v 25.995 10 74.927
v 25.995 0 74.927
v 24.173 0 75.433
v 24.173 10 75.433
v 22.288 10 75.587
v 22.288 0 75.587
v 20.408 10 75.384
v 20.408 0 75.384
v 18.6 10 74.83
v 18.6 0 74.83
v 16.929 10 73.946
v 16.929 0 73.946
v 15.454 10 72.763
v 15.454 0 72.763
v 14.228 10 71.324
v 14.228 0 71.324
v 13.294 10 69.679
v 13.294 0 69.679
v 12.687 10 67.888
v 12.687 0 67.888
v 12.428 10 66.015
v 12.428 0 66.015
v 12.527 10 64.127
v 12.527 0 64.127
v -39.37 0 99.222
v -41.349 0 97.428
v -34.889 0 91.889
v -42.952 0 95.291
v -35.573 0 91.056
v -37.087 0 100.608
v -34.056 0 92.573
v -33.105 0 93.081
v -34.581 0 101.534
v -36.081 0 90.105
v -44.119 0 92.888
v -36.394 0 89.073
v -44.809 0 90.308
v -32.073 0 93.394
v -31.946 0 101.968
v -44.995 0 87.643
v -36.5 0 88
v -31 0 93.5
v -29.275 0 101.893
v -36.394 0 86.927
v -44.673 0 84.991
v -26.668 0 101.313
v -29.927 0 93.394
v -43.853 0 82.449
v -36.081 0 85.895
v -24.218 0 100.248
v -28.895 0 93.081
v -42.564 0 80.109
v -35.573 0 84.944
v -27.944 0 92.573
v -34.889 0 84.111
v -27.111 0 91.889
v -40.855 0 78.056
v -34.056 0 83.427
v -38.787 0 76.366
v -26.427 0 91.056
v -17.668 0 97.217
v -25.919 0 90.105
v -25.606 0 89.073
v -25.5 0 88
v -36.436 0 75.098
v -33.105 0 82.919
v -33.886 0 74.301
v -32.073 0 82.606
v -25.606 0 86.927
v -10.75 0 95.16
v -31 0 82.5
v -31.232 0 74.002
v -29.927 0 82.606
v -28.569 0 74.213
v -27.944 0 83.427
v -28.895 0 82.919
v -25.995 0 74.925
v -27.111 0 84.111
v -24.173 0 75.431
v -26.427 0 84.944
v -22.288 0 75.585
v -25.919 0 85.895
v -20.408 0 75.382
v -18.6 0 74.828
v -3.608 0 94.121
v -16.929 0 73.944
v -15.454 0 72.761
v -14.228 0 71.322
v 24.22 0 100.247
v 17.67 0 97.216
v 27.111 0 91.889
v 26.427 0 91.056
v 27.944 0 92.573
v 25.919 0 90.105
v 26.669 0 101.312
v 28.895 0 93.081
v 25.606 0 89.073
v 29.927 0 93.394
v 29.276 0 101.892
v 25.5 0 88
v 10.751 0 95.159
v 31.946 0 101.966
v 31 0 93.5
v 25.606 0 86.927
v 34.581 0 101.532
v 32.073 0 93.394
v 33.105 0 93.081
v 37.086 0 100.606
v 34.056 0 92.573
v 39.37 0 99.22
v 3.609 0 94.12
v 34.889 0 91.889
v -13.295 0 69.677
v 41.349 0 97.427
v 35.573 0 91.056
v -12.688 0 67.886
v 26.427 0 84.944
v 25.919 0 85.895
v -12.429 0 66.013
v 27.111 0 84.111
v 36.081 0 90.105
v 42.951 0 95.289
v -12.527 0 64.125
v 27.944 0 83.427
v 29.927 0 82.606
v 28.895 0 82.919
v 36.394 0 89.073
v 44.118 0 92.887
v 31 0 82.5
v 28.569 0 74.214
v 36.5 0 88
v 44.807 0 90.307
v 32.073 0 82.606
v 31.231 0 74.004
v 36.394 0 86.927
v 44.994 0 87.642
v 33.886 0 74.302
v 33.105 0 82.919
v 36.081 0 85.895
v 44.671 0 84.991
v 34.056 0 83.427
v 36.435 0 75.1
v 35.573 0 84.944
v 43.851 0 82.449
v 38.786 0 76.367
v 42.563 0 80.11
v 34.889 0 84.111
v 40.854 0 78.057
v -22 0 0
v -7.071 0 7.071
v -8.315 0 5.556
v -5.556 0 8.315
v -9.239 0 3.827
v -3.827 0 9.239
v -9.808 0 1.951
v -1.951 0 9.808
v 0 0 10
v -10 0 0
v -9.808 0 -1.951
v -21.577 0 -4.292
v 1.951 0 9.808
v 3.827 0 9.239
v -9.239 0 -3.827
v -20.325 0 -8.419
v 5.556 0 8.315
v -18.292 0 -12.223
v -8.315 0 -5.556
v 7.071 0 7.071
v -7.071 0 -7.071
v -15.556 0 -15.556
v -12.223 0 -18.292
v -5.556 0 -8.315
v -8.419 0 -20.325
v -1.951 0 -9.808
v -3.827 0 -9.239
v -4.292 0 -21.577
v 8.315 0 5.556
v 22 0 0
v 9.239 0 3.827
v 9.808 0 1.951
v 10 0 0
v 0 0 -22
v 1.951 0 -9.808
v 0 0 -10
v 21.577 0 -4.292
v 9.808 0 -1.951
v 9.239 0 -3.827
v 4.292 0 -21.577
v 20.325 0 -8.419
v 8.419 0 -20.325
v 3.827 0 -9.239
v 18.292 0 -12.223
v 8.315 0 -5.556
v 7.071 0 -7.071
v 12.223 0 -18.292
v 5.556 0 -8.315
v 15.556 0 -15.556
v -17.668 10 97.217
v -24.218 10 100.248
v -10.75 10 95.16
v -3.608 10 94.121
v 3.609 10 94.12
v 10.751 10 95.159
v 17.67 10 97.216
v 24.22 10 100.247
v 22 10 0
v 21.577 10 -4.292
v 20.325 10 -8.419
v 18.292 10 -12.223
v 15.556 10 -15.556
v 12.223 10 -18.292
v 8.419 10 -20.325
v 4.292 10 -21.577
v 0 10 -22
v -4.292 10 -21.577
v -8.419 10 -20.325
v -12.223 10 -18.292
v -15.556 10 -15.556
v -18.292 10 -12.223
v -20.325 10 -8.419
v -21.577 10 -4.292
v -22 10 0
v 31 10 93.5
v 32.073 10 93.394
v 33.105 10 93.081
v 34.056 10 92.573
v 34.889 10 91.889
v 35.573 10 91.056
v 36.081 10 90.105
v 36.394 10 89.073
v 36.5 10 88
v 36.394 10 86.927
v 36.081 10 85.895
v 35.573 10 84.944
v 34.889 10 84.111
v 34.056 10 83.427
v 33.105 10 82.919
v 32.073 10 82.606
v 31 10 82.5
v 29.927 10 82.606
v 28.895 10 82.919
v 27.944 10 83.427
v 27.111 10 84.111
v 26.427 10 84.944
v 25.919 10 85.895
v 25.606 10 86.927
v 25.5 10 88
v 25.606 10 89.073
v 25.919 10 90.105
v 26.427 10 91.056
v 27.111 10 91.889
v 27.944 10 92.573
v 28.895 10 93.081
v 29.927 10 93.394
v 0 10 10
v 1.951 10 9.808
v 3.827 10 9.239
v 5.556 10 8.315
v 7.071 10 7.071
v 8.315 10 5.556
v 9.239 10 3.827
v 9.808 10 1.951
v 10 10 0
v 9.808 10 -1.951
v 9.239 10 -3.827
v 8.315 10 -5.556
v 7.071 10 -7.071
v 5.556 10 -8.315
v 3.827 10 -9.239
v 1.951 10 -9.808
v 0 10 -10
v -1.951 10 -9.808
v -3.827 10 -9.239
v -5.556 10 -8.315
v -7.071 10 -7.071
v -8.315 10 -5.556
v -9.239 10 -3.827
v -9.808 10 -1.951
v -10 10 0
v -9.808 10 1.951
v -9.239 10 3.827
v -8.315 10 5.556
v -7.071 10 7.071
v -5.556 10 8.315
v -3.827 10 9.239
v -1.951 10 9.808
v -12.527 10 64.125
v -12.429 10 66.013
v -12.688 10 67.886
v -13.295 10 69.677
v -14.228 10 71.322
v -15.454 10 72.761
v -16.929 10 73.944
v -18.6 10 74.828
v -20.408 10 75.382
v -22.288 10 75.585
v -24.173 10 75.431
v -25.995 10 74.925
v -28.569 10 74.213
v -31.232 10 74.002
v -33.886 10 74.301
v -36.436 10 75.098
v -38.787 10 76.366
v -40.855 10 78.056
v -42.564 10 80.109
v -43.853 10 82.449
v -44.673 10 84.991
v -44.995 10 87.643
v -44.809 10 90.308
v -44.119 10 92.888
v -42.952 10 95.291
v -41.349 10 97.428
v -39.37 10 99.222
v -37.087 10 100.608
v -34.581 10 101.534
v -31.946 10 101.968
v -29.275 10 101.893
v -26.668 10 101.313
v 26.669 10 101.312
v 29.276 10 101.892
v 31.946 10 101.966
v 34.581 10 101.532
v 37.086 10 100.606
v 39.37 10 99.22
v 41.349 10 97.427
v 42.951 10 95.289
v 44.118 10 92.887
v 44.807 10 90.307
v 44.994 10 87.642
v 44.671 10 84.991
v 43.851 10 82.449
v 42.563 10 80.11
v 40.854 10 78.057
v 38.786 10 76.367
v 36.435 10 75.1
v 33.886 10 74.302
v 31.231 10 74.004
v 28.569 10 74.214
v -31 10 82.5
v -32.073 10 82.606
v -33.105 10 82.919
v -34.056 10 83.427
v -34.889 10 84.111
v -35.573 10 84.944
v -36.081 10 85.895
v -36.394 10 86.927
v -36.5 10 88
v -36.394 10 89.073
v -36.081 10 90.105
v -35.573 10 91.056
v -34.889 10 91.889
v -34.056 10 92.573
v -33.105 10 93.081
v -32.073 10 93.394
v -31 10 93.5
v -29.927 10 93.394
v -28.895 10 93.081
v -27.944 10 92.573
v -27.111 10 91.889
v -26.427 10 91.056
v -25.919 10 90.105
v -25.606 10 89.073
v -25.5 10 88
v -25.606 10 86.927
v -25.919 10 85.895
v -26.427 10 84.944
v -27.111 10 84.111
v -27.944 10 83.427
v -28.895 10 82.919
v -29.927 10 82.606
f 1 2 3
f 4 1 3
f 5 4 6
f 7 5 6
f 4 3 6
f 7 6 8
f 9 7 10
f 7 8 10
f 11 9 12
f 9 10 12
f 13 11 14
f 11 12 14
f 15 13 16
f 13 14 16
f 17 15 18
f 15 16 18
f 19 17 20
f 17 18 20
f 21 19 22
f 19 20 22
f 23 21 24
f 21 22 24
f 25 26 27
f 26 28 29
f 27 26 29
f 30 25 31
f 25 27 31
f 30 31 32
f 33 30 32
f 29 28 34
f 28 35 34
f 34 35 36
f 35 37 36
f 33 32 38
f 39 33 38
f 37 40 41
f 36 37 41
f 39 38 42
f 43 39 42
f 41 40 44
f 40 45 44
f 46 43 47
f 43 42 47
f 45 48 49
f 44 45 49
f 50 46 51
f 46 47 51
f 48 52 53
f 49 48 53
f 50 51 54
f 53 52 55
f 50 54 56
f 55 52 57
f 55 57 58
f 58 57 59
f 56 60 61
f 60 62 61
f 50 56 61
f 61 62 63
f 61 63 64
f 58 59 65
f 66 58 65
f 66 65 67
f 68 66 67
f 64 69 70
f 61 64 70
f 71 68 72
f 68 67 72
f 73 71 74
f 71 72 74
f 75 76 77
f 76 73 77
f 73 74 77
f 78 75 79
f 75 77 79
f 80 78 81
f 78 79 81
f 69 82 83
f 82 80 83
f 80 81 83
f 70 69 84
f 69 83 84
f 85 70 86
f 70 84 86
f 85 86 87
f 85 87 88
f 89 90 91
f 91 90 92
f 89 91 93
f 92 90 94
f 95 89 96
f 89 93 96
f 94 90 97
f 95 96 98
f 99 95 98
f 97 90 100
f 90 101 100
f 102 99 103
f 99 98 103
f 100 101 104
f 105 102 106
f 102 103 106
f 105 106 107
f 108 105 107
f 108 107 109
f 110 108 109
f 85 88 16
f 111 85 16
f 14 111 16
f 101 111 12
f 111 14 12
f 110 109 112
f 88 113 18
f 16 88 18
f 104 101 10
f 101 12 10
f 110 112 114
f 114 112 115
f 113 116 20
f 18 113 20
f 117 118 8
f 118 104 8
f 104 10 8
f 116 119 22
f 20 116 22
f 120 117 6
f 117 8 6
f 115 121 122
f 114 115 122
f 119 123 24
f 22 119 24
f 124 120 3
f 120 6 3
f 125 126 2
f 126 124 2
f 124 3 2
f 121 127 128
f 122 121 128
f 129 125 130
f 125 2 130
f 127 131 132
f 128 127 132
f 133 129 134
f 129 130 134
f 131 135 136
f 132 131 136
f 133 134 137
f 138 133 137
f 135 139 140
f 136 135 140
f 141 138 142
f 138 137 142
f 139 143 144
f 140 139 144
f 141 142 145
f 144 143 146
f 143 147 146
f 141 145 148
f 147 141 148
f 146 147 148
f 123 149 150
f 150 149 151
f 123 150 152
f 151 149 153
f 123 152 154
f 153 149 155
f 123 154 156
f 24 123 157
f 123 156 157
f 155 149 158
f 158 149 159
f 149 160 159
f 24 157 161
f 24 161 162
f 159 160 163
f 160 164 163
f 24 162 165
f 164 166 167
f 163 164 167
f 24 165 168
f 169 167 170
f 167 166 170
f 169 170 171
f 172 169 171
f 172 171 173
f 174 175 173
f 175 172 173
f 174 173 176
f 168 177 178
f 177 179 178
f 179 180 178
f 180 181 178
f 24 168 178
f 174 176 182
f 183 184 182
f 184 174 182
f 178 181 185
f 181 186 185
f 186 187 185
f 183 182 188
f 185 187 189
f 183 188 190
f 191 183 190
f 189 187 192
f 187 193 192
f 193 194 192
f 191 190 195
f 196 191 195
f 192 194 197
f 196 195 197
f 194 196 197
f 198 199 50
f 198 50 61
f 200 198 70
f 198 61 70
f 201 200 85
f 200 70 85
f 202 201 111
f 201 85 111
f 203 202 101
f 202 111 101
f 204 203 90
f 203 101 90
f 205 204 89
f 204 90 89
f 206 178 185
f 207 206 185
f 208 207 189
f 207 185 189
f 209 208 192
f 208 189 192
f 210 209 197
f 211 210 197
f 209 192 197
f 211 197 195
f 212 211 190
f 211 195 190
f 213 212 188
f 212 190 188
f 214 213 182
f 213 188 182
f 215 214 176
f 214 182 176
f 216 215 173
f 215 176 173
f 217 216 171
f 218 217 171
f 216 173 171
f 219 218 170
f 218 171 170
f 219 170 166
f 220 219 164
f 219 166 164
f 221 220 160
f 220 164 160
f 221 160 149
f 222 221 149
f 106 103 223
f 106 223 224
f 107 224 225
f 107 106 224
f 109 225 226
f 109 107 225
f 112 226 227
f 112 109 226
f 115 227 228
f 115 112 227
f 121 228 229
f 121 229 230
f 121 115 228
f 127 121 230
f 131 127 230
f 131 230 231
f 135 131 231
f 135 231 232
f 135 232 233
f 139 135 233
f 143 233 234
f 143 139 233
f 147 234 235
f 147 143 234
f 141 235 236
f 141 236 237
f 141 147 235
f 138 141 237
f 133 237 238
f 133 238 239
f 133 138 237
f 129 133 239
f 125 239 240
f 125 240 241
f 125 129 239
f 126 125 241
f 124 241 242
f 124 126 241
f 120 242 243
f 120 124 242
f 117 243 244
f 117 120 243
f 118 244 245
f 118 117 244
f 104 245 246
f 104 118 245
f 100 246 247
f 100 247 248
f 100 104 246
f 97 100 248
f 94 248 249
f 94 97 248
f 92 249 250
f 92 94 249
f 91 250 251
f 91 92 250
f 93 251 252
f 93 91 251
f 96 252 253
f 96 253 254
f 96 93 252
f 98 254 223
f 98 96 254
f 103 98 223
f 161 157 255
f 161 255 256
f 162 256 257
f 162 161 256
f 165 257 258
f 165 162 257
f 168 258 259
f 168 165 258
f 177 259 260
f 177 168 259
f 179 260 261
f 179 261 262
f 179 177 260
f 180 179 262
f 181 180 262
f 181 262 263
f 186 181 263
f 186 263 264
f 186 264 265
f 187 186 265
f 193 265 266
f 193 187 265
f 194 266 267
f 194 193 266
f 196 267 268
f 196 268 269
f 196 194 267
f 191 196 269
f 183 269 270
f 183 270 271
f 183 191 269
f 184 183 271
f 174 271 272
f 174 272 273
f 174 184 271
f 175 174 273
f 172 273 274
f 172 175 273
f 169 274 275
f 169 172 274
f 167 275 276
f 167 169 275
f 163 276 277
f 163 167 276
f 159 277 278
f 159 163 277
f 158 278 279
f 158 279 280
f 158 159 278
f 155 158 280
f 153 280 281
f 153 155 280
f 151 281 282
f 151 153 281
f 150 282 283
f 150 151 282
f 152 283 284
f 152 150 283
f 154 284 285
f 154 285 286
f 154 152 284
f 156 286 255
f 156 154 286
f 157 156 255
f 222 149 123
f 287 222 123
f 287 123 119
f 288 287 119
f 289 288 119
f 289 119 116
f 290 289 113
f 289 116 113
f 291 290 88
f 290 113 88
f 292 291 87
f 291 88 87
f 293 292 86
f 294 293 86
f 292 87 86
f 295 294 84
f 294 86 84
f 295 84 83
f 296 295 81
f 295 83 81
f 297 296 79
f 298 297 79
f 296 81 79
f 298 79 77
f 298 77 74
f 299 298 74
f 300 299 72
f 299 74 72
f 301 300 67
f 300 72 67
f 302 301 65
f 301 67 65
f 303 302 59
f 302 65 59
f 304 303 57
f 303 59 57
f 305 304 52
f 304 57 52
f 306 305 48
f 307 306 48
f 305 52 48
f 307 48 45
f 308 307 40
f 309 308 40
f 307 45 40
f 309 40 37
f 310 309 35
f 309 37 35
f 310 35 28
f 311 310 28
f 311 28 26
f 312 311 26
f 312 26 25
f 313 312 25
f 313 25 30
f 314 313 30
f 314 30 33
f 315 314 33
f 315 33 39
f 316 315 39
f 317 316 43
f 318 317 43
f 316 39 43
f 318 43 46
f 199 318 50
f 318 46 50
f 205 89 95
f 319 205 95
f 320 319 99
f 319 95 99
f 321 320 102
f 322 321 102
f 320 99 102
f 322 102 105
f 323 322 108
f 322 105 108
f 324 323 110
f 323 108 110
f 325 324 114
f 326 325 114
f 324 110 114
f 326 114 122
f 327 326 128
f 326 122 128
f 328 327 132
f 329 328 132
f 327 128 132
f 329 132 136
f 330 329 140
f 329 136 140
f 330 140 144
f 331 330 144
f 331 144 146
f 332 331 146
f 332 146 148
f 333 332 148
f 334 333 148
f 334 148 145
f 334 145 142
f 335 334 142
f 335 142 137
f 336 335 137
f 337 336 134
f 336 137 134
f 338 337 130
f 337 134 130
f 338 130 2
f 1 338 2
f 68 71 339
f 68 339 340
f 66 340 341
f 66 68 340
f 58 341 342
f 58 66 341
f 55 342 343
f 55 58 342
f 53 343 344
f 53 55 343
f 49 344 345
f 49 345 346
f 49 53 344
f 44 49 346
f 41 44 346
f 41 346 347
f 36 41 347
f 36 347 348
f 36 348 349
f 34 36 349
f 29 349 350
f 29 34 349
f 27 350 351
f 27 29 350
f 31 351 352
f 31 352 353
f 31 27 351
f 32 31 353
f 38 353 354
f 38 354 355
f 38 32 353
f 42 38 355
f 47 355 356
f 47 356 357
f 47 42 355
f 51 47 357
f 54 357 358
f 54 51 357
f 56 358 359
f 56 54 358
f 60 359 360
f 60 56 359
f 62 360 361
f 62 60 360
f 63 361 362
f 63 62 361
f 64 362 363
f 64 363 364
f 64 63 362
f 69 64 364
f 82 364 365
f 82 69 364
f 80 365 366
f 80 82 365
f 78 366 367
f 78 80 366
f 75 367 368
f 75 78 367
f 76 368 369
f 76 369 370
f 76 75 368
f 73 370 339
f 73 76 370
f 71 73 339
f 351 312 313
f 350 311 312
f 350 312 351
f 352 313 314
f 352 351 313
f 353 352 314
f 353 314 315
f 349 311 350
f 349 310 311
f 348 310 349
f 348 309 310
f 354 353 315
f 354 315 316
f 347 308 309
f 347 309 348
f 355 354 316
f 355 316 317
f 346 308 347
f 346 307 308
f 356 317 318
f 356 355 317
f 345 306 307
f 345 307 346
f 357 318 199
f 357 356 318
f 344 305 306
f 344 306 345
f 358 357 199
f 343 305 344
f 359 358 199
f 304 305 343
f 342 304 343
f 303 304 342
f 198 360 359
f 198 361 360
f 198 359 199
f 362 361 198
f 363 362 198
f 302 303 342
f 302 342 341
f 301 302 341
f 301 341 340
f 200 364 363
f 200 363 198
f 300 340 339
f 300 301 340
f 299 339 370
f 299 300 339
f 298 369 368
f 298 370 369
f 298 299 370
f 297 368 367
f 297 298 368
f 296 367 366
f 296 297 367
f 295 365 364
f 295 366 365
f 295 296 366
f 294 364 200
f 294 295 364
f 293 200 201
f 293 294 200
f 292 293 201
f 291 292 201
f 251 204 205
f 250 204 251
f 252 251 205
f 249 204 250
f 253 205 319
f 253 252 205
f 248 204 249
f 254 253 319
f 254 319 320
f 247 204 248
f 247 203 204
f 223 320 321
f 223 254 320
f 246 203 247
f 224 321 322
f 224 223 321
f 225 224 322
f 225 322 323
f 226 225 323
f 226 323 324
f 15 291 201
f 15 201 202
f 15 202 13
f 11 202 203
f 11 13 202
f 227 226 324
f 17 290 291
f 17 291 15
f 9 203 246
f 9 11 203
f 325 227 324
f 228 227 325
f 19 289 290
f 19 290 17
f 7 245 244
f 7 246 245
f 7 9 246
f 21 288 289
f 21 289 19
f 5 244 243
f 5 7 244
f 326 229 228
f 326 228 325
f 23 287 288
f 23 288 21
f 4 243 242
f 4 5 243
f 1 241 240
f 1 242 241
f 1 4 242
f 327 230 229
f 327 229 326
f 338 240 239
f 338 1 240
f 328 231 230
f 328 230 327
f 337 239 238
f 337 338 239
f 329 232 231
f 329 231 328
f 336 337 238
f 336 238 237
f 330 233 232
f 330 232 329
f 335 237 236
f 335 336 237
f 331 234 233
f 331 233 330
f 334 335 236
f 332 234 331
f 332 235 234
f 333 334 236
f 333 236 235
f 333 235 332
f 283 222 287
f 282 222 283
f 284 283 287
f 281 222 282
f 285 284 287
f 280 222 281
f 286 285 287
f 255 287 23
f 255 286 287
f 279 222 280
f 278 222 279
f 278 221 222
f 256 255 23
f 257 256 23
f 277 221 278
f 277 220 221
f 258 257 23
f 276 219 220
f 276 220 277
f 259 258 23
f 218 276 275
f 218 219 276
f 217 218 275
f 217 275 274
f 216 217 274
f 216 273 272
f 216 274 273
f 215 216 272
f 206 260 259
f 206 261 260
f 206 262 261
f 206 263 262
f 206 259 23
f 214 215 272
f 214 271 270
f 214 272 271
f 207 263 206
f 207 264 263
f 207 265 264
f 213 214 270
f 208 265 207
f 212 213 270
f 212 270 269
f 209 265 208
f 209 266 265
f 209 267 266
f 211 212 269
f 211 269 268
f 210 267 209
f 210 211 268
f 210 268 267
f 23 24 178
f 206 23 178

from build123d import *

# Parameters (mm, degrees)
SKETCH1_R           = 10
SKETCH1_R_2         = 5.5
BOSS_EXTRUDE1_DEPTH = 10


with BuildPart() as part:
    # Sketch1 → Boss-Extrude1 (new body)
    with BuildSketch(Plane(origin=(0, 0, 0), x_dir=(1, 0, 0), z_dir=(0, 1, 0))):
        with BuildLine():
            Line((-22, 0), (-12.527017524, -64.124804454))
            ThreePointArc((-12.527017524, -64.124804454), (-16.163432373, -73.387478219), (-25.994798684, -74.925293128))
            ThreePointArc((-25.994798684, -74.925293128), (-44.965677172, -88.979725021), (-24.218363132, -100.247832518))
            ThreePointArc((-24.218363132, -100.247832518), (0.000559759, -93.990091526), (24.21978519, -100.246661496))
            ThreePointArc((24.21978519, -100.246661496), (44.96401141, -88.978987225), (25.994886362, -74.927094121))
            ThreePointArc((25.994886362, -74.927094121), (16.163301714, -73.389548338), (12.526730263, -64.126748988))
            Line((12.526730263, -64.126748988), (22, 0))
            ThreePointArc((22, 0), (0, 22), (-22, 0))
        make_face()
        with Locations(Location((0, 0, 0), (0, 0, 270))):
            Circle(SKETCH1_R, mode=Mode.SUBTRACT)
        with Locations(Location((31, -88, 0), (0, 0, 270))):
            Circle(SKETCH1_R_2, mode=Mode.SUBTRACT)
        with Locations(Location((-31, -88, 0), (0, 0, 90))):
            Circle(SKETCH1_R_2, mode=Mode.SUBTRACT)
    extrude(amount=BOSS_EXTRUDE1_DEPTH)


solid = part.part
